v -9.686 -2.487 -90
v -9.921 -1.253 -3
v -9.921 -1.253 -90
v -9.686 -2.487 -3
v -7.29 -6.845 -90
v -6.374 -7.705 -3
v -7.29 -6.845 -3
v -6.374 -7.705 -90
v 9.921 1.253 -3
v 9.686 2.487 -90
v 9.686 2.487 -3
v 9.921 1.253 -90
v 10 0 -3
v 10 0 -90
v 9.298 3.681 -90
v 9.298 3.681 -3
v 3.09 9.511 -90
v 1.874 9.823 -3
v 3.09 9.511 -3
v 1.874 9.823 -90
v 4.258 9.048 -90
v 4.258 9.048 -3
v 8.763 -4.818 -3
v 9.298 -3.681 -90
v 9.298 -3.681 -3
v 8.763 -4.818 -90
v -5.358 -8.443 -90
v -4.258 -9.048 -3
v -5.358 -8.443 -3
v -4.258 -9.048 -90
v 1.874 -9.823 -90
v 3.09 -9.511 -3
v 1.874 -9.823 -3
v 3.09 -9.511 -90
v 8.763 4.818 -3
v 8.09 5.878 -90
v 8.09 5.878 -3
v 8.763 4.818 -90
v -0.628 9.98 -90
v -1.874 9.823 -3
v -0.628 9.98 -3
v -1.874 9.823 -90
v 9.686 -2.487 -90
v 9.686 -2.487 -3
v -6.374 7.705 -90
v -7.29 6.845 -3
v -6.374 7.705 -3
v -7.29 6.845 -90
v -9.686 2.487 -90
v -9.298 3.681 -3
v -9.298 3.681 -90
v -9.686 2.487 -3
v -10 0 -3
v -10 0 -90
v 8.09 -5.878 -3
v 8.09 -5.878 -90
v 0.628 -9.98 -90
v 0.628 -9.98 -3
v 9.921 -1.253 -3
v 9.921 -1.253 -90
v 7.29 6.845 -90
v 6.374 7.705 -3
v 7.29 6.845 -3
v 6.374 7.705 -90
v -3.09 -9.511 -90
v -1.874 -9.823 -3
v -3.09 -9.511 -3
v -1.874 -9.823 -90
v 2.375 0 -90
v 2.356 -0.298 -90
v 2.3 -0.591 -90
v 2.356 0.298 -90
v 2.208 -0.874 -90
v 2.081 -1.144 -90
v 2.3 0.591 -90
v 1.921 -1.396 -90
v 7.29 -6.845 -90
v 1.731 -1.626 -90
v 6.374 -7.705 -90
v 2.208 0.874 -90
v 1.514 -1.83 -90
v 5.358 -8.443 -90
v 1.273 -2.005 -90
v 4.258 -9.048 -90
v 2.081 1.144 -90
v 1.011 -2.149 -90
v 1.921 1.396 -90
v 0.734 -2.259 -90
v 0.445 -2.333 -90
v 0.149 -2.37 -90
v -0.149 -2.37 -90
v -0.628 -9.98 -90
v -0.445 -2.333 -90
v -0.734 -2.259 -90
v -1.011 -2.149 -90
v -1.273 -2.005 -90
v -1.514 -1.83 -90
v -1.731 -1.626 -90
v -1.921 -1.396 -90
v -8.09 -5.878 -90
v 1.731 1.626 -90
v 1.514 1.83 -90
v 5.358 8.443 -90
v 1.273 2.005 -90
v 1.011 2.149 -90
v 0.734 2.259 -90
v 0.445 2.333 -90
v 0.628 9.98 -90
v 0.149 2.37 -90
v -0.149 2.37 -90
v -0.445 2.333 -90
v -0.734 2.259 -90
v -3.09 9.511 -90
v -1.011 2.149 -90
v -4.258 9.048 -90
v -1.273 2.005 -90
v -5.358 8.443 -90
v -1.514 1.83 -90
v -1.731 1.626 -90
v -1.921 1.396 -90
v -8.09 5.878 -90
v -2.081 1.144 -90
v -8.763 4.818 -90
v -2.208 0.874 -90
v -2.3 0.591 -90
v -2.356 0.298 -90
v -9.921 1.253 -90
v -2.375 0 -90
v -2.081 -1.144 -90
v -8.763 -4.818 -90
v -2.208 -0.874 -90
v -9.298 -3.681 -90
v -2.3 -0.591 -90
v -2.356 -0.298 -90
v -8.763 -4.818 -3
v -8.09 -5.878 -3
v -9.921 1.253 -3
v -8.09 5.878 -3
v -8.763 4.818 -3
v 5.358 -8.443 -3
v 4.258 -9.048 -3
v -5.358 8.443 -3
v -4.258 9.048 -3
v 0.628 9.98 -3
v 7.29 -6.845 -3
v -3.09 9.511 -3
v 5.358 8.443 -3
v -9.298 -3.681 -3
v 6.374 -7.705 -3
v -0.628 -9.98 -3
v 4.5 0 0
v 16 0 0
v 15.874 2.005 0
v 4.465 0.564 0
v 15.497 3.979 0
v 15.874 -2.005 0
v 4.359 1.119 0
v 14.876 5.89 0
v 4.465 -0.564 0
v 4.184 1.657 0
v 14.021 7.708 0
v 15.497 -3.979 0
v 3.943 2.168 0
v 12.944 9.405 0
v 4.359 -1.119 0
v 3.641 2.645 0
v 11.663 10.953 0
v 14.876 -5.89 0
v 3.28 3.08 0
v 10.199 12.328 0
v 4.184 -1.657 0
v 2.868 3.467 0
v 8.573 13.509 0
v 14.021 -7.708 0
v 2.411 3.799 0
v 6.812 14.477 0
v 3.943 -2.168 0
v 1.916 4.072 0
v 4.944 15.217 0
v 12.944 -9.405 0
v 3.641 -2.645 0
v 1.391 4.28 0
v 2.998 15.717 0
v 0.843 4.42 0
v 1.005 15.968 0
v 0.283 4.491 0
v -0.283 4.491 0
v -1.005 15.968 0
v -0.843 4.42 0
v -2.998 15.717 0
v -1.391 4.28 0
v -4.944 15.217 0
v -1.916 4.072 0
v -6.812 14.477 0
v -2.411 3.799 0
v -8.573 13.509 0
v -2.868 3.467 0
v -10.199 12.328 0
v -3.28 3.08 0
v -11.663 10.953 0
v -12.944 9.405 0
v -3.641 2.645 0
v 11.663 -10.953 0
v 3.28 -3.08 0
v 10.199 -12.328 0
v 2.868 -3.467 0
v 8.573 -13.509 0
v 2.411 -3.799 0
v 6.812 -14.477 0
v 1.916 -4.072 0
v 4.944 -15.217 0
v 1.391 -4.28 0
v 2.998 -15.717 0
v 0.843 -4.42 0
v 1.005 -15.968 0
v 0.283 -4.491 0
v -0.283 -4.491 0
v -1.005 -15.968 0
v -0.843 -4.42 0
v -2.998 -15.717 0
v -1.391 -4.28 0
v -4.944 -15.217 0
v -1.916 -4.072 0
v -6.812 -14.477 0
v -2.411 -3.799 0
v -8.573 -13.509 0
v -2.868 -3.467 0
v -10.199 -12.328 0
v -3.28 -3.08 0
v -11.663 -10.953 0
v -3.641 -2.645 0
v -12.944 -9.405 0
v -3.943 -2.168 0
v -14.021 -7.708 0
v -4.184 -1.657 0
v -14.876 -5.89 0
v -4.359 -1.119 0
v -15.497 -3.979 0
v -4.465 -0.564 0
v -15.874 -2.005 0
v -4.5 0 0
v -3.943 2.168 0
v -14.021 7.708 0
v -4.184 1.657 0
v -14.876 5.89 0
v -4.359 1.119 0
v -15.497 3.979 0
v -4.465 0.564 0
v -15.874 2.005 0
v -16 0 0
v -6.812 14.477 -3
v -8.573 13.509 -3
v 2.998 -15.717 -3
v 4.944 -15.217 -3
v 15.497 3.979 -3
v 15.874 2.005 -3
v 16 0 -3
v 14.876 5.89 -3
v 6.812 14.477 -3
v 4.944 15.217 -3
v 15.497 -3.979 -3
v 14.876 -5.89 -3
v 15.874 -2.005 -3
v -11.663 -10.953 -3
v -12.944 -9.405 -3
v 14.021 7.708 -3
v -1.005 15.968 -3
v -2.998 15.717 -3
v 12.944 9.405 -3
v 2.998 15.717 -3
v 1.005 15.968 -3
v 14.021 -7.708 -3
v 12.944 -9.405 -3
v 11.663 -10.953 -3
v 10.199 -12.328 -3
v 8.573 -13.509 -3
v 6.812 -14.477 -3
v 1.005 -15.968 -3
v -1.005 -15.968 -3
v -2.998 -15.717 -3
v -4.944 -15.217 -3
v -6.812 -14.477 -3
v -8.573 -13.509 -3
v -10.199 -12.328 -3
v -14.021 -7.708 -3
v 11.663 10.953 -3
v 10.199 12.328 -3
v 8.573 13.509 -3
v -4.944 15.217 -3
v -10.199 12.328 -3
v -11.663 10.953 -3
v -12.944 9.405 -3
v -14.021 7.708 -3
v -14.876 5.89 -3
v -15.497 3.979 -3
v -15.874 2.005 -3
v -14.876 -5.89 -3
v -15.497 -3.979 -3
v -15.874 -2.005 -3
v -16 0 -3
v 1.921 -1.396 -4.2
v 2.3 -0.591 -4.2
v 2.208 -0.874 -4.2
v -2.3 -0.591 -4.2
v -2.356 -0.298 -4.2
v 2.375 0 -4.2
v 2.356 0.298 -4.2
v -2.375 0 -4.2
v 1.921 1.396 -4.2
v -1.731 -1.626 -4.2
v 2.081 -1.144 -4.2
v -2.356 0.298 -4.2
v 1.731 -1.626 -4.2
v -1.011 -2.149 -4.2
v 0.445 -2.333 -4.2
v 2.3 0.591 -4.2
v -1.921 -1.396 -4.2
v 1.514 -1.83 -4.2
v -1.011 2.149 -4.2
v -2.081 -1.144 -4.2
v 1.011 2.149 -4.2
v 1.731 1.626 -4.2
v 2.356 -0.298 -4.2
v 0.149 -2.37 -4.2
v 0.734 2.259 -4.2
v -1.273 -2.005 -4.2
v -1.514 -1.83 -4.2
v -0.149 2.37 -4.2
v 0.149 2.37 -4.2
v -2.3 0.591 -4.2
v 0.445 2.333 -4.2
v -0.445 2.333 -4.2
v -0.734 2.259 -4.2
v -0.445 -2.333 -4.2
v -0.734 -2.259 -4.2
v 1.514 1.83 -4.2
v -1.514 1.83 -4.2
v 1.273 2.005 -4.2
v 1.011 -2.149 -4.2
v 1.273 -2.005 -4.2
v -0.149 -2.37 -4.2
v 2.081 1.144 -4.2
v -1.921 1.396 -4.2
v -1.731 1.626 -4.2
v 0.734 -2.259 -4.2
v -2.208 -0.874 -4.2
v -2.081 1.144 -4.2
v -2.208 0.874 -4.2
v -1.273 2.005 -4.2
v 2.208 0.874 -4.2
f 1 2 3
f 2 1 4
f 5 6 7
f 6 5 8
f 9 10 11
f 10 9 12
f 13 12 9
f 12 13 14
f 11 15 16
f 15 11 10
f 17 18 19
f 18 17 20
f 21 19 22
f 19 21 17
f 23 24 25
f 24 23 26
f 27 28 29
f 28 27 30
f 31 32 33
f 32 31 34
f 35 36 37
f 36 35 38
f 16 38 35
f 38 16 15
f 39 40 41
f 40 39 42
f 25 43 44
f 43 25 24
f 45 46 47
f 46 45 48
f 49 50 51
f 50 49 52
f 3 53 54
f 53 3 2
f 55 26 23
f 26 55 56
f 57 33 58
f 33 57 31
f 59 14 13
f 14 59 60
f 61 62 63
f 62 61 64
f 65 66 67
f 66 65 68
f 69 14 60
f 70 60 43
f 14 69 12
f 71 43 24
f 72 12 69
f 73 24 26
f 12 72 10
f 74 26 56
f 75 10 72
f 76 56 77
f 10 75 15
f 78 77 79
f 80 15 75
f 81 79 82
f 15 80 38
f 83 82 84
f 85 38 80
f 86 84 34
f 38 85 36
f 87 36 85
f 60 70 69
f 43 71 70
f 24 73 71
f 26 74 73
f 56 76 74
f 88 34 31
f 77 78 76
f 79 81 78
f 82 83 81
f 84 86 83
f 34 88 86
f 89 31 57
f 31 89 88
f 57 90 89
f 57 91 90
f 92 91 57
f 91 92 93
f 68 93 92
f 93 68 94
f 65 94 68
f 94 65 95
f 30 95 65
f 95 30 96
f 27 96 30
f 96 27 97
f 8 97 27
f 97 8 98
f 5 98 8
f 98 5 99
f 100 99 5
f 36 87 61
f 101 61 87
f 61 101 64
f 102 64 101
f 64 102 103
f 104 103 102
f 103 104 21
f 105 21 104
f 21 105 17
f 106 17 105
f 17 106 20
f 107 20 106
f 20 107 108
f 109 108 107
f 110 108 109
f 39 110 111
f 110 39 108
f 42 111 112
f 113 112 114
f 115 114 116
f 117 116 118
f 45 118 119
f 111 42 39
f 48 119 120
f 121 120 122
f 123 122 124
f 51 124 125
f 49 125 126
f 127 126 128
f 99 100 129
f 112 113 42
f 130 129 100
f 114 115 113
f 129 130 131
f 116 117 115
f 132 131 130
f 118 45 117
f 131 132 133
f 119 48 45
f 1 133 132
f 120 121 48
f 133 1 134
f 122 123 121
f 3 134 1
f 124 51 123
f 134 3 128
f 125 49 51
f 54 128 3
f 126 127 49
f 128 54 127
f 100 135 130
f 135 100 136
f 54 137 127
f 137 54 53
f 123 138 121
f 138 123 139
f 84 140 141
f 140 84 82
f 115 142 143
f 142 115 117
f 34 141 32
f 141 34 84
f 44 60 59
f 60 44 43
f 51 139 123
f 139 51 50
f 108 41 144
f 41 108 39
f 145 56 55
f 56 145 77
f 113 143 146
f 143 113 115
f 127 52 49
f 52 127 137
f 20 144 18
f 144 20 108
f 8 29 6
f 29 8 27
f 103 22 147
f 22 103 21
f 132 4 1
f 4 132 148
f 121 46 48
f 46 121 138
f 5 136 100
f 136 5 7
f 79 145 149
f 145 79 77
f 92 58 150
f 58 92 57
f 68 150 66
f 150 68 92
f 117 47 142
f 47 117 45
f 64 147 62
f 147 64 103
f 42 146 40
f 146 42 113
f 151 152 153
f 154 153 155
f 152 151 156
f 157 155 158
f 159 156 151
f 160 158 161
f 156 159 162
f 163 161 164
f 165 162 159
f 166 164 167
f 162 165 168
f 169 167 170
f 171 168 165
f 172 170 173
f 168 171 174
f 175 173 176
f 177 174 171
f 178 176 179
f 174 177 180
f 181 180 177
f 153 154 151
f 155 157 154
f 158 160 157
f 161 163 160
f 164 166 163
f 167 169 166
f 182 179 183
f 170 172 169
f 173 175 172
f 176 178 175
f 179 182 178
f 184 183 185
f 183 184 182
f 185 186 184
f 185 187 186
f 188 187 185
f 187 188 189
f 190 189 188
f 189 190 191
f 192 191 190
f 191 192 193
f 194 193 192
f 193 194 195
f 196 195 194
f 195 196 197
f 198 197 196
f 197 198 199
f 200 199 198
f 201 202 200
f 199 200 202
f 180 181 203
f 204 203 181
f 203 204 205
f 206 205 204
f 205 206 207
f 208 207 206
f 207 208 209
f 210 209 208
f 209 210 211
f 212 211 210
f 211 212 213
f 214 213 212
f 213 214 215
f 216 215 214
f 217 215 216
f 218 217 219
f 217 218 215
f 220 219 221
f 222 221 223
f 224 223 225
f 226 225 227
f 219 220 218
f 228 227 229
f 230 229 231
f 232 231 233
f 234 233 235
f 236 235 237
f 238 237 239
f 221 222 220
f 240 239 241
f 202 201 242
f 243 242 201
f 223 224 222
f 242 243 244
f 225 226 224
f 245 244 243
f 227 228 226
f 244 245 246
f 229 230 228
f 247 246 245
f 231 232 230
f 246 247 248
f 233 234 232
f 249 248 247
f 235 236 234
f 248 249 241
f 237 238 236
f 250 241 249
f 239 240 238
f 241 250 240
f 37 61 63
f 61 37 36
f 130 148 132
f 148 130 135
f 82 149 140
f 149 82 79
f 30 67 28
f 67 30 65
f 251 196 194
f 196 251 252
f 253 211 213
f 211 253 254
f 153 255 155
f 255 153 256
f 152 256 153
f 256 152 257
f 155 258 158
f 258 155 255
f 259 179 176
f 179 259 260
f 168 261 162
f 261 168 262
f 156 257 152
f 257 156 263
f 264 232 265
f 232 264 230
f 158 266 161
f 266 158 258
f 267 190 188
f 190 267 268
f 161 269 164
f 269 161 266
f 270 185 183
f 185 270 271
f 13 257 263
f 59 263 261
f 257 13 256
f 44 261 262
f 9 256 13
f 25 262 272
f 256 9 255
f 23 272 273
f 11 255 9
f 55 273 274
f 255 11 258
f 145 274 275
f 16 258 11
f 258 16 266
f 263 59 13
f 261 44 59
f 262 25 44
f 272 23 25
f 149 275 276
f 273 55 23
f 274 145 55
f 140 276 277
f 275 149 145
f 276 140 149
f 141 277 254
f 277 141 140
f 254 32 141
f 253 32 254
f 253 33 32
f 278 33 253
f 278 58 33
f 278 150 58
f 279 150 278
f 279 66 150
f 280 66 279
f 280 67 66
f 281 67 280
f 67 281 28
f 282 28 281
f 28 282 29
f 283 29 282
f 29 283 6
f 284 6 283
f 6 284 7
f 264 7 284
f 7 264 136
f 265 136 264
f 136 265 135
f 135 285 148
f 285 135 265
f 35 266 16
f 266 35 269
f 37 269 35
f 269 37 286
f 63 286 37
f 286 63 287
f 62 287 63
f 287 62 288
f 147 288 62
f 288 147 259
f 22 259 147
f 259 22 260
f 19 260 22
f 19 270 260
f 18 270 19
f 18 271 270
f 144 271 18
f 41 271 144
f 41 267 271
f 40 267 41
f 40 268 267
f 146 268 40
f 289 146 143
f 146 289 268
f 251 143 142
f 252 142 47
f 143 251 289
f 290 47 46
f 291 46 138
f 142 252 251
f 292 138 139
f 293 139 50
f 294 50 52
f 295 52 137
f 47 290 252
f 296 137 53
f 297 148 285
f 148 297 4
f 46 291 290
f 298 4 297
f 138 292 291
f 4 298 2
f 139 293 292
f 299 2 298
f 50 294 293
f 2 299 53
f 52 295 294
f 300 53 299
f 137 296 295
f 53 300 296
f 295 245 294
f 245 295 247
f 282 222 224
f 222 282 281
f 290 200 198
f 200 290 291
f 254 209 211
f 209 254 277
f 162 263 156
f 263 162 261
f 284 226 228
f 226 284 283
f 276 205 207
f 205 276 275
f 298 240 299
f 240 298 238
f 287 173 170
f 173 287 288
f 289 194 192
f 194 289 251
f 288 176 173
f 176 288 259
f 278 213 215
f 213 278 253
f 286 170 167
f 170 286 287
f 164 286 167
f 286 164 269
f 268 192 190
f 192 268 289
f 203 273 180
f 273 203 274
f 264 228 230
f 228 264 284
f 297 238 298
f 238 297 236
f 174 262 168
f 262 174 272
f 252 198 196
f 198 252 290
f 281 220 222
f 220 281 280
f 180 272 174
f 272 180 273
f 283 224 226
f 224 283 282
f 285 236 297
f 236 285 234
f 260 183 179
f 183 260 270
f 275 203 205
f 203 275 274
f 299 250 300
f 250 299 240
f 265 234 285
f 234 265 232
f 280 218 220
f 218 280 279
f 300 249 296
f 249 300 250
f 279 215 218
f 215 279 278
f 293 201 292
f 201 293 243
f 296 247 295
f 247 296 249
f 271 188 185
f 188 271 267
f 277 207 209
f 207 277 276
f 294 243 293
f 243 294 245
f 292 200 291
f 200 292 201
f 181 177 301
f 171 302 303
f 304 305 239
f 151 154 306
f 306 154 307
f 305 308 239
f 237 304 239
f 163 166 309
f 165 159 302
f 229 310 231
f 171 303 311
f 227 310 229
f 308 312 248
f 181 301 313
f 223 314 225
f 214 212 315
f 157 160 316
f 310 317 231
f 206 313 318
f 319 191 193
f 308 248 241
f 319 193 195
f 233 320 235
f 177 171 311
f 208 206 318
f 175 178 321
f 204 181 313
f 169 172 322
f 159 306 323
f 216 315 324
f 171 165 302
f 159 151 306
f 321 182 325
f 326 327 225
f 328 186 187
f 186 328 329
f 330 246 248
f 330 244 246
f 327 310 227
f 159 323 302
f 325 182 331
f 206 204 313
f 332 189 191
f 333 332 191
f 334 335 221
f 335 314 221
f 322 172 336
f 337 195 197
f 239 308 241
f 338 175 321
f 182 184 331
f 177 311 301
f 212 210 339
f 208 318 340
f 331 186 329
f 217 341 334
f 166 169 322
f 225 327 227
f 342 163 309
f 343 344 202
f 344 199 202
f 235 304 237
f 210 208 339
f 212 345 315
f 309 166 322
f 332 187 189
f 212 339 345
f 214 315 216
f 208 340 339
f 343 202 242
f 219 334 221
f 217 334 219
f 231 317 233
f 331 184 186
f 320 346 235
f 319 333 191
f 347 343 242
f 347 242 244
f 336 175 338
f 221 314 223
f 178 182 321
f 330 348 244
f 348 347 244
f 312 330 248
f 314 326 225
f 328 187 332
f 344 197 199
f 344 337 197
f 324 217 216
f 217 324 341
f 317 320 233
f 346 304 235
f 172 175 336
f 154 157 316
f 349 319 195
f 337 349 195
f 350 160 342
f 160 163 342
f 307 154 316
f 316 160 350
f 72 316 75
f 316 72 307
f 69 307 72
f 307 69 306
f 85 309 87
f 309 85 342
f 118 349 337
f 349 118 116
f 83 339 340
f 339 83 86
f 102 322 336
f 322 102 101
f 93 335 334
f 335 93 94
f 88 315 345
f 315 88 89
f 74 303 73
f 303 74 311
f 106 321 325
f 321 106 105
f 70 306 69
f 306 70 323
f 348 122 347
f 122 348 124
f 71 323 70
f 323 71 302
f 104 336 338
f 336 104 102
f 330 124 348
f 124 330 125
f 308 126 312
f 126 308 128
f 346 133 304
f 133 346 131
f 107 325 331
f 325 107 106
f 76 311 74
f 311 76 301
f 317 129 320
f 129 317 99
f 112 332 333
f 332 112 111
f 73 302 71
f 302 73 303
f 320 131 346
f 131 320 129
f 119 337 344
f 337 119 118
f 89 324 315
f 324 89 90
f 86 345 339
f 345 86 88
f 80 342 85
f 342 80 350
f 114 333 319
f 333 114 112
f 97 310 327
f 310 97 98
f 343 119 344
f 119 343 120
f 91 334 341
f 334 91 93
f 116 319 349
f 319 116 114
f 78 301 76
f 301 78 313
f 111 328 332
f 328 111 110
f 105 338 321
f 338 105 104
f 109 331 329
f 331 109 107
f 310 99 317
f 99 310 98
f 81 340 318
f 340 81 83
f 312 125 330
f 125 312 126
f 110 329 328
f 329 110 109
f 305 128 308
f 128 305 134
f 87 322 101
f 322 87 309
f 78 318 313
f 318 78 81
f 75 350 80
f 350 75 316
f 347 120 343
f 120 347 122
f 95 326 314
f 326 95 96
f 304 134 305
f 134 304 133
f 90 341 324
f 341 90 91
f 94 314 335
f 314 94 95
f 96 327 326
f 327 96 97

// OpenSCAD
$fn = 50;


difference() {
	union() {
		translate(v = [0, 0, -90.0000000000]) {
			cylinder(h = 90, r = 10.0000000000);
		}
		translate(v = [0, 0, -3.0000000000]) {
			cylinder(h = 3, r = 16.0000000000);
		}
	}
	union() {
		translate(v = [0, 0, 0]) {
			rotate(a = [0, 0, 0]) {
				difference() {
					union() {
						#translate(v = [0, 0, -90.0000000000]) {
							cylinder(h = 90, r = 2.2500000000);
						}
						#translate(v = [0, 0, -4.2000000000]) {
							cylinder(h = 4.2000000000, r1 = 2.3750000000, r2 = 4.5000000000);
						}
						#translate(v = [0, 0, -90.0000000000]) {
							cylinder(h = 90, r = 2.3750000000);
						}
						#translate(v = [0, 0, -90.0000000000]) {
							cylinder(h = 90, r = 2.2500000000);
						}
					}
					union();
				}
			}
		}
	}
}
